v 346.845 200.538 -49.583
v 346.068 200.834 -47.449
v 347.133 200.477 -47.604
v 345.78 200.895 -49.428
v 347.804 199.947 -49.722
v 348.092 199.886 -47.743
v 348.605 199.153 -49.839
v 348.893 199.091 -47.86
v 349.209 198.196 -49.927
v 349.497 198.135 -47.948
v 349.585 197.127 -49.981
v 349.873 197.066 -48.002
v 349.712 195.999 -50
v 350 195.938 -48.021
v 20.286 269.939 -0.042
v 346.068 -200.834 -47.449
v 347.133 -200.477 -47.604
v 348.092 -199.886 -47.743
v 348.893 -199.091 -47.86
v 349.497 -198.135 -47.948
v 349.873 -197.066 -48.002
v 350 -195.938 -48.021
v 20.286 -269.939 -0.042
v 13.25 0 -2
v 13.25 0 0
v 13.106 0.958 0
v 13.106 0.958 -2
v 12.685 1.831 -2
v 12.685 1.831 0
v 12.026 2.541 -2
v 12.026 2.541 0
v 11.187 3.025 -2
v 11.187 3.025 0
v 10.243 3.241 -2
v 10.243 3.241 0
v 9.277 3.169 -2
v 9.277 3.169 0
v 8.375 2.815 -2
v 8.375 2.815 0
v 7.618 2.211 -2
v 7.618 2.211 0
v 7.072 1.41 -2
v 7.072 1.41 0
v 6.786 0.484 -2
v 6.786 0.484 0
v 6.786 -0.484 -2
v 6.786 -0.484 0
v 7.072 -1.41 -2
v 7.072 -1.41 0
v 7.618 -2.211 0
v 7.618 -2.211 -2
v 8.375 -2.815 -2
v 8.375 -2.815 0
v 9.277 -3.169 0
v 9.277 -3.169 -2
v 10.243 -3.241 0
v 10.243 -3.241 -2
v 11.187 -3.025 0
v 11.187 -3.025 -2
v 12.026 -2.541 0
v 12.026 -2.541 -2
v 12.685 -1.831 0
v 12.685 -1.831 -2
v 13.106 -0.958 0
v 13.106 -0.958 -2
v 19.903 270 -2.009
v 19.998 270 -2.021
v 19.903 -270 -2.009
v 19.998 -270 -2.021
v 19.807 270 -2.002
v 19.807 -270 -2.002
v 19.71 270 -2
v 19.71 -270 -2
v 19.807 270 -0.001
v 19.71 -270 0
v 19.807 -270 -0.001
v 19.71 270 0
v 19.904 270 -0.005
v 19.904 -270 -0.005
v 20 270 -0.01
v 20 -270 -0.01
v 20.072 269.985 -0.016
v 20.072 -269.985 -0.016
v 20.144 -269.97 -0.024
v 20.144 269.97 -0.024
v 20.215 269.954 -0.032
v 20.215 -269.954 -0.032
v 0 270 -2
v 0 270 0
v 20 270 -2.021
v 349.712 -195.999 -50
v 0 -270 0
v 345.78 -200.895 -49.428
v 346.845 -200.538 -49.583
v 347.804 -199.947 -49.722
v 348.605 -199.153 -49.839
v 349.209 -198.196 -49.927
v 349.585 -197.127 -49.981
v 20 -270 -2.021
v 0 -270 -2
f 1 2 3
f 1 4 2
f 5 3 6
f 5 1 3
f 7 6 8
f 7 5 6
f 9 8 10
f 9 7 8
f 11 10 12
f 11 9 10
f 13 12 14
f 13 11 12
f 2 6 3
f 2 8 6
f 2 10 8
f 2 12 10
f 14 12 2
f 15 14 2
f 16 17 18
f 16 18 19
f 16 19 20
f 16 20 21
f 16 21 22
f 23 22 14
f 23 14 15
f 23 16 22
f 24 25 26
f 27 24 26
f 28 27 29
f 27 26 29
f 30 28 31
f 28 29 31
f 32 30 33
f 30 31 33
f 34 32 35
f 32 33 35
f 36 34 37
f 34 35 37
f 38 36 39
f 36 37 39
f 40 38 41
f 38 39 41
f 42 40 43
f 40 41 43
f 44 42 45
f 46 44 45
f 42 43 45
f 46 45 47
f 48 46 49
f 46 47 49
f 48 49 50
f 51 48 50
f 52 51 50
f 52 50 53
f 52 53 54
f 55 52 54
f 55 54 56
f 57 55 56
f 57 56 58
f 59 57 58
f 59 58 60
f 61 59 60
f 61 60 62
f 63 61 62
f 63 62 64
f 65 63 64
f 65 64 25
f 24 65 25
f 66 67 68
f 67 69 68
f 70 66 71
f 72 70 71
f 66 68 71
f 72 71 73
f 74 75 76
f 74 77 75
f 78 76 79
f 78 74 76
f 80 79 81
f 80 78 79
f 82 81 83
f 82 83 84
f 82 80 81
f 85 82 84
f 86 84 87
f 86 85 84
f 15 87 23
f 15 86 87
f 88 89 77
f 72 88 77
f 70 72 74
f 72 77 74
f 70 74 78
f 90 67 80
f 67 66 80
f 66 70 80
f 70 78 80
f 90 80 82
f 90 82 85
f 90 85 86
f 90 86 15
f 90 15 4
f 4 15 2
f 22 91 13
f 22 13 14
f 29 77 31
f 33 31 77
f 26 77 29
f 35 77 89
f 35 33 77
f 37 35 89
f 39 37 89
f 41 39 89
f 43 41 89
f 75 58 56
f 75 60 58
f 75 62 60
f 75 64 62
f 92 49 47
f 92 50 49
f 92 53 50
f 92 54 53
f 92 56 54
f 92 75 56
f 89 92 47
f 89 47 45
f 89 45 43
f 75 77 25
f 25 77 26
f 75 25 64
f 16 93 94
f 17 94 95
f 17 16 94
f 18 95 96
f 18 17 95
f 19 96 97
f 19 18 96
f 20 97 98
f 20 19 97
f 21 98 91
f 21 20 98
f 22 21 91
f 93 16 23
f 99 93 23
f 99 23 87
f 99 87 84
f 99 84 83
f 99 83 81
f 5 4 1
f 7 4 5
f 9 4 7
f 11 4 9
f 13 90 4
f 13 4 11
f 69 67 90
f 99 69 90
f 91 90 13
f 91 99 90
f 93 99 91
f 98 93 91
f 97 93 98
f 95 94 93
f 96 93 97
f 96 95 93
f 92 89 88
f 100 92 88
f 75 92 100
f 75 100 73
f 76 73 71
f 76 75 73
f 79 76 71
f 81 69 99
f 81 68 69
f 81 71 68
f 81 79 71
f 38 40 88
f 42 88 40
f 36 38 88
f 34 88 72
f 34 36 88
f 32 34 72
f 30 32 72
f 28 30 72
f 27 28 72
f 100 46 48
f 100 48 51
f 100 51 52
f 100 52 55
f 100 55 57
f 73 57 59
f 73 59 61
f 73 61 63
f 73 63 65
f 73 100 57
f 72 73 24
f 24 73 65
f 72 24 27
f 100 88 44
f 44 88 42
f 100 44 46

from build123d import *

# Parameters (mm, degrees)
F1_DEPTH = 270
F3_DEPTH = 55
F4_R     = 4
F5_R     = 2
F6_R     = 5
F7_R     = 3.25
F8_DEPTH = 25


with BuildPart() as f1:
    # F0 (on Front) → F1 (new body, symmetric)
    with BuildSketch(Plane.XZ):
        Polygon((20, 0), (0, 0), (0, -2), (19.855245, -2), (349.711998, -50), (350, -48.020845), align=None)
    extrude(amount=F1_DEPTH, both=True)

    # F2 (on face) → F3 (cut)
    with BuildSketch(Plane.XY):
        Polygon((350, -200), (20, -270), (20, -308.046314), (437.196553, -308.046314), (437.196553, -200), align=None)
        Polygon((20, 308.046314), (20, 270), (350, 200), (437.196553, 200), (437.196553, 308.046314), align=None)
    extrude(amount=-F3_DEPTH, mode=Mode.SUBTRACT)

    # F4
    f4_edges = [f1.edges().sort_by_distance(p)[0] for p in [
        (20, 0, 0),
    ]]
    fillet(f4_edges, radius=F4_R)

    # F5
    f5_edges = [f1.edges().sort_by_distance(p)[0] for p in [
        (19.855245, 0, -2),
    ]]
    fillet(f5_edges, radius=F5_R)

    # F6
    f6_edges = [f1.edges().sort_by_distance(p)[0] for p in [
        (349.855999, -200.030546, -49.010422),
        (349.855999, 200.030546, -49.010422),
    ]]
    fillet(f6_edges, radius=F6_R)

    # F7 (on face) → F8 (cut)
    with BuildSketch(Plane.XY):
        with Locations((10, 0)):
            Circle(F7_R)
    extrude(amount=-F8_DEPTH, mode=Mode.SUBTRACT)


solid = f1.part
